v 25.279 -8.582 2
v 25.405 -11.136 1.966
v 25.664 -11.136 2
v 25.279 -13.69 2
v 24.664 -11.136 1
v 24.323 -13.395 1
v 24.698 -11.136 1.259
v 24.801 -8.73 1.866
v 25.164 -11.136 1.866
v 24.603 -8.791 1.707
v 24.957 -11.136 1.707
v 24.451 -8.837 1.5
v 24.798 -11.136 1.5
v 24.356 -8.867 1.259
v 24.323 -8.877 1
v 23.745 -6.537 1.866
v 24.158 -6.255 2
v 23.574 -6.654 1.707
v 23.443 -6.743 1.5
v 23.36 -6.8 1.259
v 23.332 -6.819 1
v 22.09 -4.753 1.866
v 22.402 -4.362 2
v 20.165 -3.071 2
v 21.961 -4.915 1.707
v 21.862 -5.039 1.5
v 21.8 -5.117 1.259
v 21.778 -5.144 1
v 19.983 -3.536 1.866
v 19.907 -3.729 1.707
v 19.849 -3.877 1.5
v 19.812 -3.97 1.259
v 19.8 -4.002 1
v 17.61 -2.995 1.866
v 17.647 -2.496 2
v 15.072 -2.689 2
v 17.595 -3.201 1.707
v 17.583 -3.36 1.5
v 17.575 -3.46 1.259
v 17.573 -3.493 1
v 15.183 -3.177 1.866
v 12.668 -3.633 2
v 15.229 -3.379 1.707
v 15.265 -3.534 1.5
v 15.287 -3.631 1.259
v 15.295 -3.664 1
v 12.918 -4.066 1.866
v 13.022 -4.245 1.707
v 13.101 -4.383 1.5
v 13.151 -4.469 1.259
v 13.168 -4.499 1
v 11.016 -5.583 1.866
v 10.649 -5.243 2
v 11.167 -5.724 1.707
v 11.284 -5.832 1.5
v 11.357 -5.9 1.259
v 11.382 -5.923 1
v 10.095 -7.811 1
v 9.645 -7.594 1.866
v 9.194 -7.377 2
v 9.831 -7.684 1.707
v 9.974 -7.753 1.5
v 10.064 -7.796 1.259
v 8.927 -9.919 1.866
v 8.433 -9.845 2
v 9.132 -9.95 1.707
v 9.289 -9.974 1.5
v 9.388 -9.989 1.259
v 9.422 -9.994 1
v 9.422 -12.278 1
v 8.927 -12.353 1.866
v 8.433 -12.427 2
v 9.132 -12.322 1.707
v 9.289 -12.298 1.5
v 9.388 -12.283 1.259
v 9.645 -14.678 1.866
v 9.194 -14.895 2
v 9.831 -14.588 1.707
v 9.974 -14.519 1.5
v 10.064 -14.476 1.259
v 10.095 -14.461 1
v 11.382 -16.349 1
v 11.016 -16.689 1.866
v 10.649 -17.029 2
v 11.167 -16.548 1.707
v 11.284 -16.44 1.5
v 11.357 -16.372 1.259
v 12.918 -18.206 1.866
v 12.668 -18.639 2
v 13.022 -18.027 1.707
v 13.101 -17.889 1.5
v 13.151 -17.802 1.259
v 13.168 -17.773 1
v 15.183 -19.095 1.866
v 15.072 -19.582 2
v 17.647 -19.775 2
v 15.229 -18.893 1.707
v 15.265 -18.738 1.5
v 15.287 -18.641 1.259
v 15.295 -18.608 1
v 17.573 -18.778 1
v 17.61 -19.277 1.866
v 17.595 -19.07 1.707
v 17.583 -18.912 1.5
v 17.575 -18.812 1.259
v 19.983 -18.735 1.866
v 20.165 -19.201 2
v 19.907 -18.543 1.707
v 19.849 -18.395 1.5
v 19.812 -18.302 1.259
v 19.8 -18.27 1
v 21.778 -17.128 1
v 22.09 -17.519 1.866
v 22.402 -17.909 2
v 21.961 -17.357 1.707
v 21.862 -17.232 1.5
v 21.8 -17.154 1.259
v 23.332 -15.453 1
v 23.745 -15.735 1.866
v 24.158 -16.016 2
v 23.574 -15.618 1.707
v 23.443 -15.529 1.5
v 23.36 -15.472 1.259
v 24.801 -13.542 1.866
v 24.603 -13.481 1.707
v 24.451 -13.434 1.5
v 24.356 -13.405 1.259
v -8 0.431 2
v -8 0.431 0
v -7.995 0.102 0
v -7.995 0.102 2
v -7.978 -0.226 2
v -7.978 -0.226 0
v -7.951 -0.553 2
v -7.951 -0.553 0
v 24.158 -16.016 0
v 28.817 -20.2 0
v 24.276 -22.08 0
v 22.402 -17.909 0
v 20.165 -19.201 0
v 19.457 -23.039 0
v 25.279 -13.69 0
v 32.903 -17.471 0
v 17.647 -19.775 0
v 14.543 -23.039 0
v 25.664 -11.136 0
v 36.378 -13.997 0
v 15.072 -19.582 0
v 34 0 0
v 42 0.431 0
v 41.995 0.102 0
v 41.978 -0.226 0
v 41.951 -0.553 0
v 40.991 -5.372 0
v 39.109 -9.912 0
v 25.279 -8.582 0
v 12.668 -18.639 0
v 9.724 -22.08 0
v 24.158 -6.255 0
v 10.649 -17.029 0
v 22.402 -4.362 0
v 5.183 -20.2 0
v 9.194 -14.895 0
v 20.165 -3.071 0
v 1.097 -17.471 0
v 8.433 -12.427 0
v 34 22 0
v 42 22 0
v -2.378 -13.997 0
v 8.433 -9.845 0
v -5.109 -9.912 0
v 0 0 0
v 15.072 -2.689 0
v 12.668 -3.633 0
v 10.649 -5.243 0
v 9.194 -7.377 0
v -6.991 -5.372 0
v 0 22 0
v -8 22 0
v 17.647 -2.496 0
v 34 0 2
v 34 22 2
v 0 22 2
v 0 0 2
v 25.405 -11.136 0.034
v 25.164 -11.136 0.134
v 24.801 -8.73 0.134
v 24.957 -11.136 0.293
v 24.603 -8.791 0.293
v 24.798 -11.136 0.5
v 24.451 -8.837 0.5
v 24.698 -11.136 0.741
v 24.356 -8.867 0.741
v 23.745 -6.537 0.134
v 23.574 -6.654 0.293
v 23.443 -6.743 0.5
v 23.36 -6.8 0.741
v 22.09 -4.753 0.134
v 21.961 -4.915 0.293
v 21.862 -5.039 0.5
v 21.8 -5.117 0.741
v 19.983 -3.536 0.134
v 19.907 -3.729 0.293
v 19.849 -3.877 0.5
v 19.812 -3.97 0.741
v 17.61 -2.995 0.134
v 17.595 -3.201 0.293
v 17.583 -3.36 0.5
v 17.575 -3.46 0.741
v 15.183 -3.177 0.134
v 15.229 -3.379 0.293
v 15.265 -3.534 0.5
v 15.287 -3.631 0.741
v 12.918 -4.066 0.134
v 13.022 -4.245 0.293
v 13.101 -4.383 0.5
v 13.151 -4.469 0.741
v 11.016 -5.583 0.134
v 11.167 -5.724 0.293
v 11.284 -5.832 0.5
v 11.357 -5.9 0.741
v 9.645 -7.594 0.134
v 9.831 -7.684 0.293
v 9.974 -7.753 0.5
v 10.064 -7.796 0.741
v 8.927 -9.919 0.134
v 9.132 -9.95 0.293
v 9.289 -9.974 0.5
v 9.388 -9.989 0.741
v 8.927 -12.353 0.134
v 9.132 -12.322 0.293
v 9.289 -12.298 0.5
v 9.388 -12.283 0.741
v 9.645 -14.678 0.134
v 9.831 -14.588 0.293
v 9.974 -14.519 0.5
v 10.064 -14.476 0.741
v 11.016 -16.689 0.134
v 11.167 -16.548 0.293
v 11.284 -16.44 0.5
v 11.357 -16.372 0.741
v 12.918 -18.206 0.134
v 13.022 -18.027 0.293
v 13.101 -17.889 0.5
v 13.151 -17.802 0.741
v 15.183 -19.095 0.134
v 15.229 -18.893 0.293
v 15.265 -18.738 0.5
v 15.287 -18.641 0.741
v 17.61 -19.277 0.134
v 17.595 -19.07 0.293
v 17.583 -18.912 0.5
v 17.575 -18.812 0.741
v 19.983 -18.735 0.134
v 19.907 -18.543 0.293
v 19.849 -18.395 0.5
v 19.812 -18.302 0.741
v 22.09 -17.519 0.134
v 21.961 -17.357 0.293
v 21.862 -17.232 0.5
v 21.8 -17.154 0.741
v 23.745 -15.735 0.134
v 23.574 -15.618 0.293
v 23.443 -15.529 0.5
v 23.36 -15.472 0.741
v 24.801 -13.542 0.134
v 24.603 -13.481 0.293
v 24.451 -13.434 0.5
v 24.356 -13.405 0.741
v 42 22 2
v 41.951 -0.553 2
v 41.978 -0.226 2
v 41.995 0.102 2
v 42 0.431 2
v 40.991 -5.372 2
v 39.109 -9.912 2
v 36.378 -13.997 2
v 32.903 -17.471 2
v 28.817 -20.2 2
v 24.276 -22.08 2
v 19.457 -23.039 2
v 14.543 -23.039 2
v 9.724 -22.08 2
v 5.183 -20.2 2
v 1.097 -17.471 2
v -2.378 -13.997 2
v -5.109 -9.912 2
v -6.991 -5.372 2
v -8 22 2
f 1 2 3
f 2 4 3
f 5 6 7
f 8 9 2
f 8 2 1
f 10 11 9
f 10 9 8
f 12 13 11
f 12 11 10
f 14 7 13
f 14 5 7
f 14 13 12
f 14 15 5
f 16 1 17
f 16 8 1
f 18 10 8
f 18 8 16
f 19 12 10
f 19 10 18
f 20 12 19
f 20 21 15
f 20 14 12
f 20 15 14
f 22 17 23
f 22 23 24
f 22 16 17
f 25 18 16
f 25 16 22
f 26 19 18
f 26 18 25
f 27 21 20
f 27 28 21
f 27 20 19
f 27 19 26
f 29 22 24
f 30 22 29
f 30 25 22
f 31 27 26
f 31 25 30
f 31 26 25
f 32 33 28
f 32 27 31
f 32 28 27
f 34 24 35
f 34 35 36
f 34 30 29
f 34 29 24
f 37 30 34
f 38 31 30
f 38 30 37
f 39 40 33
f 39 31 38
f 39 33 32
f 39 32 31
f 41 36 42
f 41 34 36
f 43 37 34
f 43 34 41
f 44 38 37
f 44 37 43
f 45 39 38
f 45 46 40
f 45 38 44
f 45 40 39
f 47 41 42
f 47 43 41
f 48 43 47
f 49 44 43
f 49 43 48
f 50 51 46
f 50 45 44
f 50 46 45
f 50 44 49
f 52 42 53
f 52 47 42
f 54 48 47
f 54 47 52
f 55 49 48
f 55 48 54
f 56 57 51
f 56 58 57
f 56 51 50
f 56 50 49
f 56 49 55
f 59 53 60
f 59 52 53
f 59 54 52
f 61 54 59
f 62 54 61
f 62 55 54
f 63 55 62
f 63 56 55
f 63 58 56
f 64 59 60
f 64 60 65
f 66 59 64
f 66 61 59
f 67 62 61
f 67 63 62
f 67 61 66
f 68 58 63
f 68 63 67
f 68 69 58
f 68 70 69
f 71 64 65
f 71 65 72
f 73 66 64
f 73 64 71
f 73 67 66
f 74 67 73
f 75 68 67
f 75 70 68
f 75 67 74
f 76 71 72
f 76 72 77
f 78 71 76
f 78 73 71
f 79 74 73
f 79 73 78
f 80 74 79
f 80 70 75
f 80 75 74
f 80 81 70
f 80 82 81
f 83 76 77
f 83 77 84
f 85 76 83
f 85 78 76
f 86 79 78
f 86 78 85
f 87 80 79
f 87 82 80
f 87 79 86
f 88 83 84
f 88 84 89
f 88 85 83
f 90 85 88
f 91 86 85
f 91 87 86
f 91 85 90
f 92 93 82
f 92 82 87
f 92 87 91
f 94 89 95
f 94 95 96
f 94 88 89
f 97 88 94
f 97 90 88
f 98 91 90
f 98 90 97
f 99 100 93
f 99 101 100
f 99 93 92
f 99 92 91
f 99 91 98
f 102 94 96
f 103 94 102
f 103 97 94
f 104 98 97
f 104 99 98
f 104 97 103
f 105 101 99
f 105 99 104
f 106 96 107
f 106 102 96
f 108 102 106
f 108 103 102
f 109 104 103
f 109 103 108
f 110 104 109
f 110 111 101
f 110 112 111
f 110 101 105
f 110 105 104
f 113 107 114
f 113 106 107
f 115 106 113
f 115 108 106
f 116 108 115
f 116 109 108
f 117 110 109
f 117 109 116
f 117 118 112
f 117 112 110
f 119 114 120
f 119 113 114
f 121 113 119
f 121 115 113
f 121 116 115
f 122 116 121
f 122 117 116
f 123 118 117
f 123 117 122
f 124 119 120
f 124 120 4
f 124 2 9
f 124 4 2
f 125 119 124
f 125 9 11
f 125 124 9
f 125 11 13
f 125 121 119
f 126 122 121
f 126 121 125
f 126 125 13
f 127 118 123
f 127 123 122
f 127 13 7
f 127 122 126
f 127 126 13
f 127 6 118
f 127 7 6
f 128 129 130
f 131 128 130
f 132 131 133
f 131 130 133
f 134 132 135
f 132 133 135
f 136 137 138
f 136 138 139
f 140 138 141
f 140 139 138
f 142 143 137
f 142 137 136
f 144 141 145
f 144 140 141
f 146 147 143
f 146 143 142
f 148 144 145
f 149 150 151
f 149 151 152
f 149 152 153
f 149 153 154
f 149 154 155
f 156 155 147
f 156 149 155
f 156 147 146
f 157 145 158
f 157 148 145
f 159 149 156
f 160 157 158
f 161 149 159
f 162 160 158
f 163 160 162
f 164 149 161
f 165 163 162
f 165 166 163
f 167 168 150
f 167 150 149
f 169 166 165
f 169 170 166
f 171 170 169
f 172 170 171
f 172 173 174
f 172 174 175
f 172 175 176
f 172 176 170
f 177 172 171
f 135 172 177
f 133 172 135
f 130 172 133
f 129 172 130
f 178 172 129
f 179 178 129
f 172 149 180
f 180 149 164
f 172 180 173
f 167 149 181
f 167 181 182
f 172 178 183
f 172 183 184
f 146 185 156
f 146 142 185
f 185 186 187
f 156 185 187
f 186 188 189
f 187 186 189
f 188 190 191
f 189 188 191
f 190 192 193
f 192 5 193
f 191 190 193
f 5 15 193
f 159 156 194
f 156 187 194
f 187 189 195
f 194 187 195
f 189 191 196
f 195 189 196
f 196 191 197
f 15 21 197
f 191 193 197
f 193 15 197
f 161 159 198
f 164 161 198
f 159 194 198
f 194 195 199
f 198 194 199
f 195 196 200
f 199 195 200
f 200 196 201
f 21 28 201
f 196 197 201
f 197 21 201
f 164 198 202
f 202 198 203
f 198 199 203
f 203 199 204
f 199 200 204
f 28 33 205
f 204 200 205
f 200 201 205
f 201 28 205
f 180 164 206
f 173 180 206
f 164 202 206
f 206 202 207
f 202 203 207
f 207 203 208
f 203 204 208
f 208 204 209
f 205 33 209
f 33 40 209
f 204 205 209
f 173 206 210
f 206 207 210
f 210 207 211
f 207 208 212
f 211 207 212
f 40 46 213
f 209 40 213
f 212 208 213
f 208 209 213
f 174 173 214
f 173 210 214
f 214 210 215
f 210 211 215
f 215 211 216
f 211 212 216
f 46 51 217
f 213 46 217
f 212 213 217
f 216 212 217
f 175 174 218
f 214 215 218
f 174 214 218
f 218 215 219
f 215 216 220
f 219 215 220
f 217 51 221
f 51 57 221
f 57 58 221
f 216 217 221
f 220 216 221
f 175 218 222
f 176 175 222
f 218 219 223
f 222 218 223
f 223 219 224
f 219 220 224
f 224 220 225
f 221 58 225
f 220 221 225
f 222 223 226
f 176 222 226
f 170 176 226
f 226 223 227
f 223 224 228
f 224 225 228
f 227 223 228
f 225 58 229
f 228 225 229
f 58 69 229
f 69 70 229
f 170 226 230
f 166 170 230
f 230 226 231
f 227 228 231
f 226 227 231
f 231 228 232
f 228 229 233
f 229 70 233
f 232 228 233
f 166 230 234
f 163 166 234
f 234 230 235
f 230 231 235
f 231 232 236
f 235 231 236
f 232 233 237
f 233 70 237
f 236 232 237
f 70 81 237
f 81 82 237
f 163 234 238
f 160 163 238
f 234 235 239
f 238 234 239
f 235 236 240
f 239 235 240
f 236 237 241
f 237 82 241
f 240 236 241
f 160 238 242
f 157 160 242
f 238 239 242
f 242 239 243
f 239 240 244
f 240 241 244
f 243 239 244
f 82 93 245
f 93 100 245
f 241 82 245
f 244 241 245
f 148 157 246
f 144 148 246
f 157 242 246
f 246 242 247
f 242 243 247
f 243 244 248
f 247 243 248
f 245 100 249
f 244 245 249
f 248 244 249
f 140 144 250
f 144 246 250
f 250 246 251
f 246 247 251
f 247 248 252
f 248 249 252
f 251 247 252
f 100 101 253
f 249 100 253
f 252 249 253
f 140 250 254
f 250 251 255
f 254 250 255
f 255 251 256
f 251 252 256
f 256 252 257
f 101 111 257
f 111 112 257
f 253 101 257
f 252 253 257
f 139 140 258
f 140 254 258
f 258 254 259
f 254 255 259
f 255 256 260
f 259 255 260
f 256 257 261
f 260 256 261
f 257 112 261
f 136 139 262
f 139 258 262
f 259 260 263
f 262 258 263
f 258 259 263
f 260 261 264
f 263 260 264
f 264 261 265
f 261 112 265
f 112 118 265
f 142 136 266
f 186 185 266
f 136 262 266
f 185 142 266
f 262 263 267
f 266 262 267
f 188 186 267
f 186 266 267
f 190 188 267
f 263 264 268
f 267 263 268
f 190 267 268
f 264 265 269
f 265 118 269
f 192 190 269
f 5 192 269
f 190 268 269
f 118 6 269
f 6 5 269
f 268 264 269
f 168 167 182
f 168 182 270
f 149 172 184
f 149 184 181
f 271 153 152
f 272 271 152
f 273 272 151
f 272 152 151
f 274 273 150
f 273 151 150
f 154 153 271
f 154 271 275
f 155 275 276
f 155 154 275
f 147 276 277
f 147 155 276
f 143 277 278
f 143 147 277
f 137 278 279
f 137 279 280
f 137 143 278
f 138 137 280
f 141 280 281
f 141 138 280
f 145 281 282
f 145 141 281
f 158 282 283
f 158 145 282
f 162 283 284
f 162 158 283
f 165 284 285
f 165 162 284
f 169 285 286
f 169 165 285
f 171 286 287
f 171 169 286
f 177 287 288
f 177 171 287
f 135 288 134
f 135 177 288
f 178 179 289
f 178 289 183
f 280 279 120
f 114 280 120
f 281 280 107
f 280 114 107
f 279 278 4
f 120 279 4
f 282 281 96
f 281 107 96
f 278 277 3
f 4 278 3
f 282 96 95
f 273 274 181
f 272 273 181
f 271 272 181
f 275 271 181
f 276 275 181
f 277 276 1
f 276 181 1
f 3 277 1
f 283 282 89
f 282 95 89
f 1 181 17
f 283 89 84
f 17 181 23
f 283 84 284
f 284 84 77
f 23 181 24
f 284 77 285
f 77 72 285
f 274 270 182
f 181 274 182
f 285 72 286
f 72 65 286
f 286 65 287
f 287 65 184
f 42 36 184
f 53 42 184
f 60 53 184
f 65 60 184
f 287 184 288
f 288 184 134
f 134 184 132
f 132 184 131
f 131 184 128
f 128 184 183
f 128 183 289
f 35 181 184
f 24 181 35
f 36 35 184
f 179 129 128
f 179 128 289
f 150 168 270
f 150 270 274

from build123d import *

# Parameters (mm, degrees)
ESQUISSE1_R        = 7.66384886
BOSS_EXTRU_1_DEPTH = 2
CONG_1_R           = 10
CONG_2_R           = 1


# Some blends are built 0.0001 mm under size
with BuildPart() as part:
    # Esquisse1 → Boss.-Extru.1 (new body)
    with BuildSketch(Plane.XY):
        with BuildLine():
            Line((0, 0), (34, 0))
            Line((34, 0), (34, 22))
            Line((34, 22), (42, 22))
            Line((42, 22), (42, 0))
            ThreePointArc((42, 0), (17, -23.15919806), (-8, 0))
            Line((-8, 0), (-8, 22))
            Line((-8, 22), (0, 22))
            Line((0, 22), (0, 0))
        make_face()
        with Locations((17, -11.135898069)):
            Circle(ESQUISSE1_R, mode=Mode.SUBTRACT)
    extrude(amount=BOSS_EXTRU_1_DEPTH)

    # Congé1
    # the kernel refuses this fillet: 10 mm, written as the material it takes off along each edge
    with BuildSketch(Plane(origin=(42, 0, -1.388699458), x_dir=(0, 1, 0), z_dir=(0, 0, 1))) as cong_1_piece_1:
        with BuildLine():
            CenterArc((0.430691066, 10), CONG_1_R, 264.352690034, 5.647309966)
            ThreePointArc((-0.553355337, 0.048535149), (-0.276812081, 0.022735123), (0, 0))
            Line((0, 0), (0.430691066, 0))
        make_face()
    extrude(amount=4.777398915, mode=Mode.SUBTRACT)
    with BuildSketch(Plane(origin=(-8, 0, -1.388699458), x_dir=(0.08737518565273034, -0.9961754749702236, 0), z_dir=(0, 0, 1))) as cong_1_piece_2:
        with BuildLine():
            CenterArc((0.444707979, 9.999386462), CONG_1_R, 264.987378699, 5.647309966)
            Line((-0.429043877, 0.037631712), (0, 0))
            ThreePointArc((0, 0), (0.277739892, -0.001538335), (0.555479783, 0))
        make_face()
    extrude(amount=4.777398915, mode=Mode.SUBTRACT)

    # Congé2
    cong_2_edges = [part.edges().sort_by_distance(p)[0] for p in [
        (9.33615114, -11.135898069, 0),
        (9.33615114, -11.135898069, 2),
    ]]
    fillet(cong_2_edges, radius=CONG_2_R - 0.0001)  # a hair under: the kernel refuses the full size


solid = part.part
